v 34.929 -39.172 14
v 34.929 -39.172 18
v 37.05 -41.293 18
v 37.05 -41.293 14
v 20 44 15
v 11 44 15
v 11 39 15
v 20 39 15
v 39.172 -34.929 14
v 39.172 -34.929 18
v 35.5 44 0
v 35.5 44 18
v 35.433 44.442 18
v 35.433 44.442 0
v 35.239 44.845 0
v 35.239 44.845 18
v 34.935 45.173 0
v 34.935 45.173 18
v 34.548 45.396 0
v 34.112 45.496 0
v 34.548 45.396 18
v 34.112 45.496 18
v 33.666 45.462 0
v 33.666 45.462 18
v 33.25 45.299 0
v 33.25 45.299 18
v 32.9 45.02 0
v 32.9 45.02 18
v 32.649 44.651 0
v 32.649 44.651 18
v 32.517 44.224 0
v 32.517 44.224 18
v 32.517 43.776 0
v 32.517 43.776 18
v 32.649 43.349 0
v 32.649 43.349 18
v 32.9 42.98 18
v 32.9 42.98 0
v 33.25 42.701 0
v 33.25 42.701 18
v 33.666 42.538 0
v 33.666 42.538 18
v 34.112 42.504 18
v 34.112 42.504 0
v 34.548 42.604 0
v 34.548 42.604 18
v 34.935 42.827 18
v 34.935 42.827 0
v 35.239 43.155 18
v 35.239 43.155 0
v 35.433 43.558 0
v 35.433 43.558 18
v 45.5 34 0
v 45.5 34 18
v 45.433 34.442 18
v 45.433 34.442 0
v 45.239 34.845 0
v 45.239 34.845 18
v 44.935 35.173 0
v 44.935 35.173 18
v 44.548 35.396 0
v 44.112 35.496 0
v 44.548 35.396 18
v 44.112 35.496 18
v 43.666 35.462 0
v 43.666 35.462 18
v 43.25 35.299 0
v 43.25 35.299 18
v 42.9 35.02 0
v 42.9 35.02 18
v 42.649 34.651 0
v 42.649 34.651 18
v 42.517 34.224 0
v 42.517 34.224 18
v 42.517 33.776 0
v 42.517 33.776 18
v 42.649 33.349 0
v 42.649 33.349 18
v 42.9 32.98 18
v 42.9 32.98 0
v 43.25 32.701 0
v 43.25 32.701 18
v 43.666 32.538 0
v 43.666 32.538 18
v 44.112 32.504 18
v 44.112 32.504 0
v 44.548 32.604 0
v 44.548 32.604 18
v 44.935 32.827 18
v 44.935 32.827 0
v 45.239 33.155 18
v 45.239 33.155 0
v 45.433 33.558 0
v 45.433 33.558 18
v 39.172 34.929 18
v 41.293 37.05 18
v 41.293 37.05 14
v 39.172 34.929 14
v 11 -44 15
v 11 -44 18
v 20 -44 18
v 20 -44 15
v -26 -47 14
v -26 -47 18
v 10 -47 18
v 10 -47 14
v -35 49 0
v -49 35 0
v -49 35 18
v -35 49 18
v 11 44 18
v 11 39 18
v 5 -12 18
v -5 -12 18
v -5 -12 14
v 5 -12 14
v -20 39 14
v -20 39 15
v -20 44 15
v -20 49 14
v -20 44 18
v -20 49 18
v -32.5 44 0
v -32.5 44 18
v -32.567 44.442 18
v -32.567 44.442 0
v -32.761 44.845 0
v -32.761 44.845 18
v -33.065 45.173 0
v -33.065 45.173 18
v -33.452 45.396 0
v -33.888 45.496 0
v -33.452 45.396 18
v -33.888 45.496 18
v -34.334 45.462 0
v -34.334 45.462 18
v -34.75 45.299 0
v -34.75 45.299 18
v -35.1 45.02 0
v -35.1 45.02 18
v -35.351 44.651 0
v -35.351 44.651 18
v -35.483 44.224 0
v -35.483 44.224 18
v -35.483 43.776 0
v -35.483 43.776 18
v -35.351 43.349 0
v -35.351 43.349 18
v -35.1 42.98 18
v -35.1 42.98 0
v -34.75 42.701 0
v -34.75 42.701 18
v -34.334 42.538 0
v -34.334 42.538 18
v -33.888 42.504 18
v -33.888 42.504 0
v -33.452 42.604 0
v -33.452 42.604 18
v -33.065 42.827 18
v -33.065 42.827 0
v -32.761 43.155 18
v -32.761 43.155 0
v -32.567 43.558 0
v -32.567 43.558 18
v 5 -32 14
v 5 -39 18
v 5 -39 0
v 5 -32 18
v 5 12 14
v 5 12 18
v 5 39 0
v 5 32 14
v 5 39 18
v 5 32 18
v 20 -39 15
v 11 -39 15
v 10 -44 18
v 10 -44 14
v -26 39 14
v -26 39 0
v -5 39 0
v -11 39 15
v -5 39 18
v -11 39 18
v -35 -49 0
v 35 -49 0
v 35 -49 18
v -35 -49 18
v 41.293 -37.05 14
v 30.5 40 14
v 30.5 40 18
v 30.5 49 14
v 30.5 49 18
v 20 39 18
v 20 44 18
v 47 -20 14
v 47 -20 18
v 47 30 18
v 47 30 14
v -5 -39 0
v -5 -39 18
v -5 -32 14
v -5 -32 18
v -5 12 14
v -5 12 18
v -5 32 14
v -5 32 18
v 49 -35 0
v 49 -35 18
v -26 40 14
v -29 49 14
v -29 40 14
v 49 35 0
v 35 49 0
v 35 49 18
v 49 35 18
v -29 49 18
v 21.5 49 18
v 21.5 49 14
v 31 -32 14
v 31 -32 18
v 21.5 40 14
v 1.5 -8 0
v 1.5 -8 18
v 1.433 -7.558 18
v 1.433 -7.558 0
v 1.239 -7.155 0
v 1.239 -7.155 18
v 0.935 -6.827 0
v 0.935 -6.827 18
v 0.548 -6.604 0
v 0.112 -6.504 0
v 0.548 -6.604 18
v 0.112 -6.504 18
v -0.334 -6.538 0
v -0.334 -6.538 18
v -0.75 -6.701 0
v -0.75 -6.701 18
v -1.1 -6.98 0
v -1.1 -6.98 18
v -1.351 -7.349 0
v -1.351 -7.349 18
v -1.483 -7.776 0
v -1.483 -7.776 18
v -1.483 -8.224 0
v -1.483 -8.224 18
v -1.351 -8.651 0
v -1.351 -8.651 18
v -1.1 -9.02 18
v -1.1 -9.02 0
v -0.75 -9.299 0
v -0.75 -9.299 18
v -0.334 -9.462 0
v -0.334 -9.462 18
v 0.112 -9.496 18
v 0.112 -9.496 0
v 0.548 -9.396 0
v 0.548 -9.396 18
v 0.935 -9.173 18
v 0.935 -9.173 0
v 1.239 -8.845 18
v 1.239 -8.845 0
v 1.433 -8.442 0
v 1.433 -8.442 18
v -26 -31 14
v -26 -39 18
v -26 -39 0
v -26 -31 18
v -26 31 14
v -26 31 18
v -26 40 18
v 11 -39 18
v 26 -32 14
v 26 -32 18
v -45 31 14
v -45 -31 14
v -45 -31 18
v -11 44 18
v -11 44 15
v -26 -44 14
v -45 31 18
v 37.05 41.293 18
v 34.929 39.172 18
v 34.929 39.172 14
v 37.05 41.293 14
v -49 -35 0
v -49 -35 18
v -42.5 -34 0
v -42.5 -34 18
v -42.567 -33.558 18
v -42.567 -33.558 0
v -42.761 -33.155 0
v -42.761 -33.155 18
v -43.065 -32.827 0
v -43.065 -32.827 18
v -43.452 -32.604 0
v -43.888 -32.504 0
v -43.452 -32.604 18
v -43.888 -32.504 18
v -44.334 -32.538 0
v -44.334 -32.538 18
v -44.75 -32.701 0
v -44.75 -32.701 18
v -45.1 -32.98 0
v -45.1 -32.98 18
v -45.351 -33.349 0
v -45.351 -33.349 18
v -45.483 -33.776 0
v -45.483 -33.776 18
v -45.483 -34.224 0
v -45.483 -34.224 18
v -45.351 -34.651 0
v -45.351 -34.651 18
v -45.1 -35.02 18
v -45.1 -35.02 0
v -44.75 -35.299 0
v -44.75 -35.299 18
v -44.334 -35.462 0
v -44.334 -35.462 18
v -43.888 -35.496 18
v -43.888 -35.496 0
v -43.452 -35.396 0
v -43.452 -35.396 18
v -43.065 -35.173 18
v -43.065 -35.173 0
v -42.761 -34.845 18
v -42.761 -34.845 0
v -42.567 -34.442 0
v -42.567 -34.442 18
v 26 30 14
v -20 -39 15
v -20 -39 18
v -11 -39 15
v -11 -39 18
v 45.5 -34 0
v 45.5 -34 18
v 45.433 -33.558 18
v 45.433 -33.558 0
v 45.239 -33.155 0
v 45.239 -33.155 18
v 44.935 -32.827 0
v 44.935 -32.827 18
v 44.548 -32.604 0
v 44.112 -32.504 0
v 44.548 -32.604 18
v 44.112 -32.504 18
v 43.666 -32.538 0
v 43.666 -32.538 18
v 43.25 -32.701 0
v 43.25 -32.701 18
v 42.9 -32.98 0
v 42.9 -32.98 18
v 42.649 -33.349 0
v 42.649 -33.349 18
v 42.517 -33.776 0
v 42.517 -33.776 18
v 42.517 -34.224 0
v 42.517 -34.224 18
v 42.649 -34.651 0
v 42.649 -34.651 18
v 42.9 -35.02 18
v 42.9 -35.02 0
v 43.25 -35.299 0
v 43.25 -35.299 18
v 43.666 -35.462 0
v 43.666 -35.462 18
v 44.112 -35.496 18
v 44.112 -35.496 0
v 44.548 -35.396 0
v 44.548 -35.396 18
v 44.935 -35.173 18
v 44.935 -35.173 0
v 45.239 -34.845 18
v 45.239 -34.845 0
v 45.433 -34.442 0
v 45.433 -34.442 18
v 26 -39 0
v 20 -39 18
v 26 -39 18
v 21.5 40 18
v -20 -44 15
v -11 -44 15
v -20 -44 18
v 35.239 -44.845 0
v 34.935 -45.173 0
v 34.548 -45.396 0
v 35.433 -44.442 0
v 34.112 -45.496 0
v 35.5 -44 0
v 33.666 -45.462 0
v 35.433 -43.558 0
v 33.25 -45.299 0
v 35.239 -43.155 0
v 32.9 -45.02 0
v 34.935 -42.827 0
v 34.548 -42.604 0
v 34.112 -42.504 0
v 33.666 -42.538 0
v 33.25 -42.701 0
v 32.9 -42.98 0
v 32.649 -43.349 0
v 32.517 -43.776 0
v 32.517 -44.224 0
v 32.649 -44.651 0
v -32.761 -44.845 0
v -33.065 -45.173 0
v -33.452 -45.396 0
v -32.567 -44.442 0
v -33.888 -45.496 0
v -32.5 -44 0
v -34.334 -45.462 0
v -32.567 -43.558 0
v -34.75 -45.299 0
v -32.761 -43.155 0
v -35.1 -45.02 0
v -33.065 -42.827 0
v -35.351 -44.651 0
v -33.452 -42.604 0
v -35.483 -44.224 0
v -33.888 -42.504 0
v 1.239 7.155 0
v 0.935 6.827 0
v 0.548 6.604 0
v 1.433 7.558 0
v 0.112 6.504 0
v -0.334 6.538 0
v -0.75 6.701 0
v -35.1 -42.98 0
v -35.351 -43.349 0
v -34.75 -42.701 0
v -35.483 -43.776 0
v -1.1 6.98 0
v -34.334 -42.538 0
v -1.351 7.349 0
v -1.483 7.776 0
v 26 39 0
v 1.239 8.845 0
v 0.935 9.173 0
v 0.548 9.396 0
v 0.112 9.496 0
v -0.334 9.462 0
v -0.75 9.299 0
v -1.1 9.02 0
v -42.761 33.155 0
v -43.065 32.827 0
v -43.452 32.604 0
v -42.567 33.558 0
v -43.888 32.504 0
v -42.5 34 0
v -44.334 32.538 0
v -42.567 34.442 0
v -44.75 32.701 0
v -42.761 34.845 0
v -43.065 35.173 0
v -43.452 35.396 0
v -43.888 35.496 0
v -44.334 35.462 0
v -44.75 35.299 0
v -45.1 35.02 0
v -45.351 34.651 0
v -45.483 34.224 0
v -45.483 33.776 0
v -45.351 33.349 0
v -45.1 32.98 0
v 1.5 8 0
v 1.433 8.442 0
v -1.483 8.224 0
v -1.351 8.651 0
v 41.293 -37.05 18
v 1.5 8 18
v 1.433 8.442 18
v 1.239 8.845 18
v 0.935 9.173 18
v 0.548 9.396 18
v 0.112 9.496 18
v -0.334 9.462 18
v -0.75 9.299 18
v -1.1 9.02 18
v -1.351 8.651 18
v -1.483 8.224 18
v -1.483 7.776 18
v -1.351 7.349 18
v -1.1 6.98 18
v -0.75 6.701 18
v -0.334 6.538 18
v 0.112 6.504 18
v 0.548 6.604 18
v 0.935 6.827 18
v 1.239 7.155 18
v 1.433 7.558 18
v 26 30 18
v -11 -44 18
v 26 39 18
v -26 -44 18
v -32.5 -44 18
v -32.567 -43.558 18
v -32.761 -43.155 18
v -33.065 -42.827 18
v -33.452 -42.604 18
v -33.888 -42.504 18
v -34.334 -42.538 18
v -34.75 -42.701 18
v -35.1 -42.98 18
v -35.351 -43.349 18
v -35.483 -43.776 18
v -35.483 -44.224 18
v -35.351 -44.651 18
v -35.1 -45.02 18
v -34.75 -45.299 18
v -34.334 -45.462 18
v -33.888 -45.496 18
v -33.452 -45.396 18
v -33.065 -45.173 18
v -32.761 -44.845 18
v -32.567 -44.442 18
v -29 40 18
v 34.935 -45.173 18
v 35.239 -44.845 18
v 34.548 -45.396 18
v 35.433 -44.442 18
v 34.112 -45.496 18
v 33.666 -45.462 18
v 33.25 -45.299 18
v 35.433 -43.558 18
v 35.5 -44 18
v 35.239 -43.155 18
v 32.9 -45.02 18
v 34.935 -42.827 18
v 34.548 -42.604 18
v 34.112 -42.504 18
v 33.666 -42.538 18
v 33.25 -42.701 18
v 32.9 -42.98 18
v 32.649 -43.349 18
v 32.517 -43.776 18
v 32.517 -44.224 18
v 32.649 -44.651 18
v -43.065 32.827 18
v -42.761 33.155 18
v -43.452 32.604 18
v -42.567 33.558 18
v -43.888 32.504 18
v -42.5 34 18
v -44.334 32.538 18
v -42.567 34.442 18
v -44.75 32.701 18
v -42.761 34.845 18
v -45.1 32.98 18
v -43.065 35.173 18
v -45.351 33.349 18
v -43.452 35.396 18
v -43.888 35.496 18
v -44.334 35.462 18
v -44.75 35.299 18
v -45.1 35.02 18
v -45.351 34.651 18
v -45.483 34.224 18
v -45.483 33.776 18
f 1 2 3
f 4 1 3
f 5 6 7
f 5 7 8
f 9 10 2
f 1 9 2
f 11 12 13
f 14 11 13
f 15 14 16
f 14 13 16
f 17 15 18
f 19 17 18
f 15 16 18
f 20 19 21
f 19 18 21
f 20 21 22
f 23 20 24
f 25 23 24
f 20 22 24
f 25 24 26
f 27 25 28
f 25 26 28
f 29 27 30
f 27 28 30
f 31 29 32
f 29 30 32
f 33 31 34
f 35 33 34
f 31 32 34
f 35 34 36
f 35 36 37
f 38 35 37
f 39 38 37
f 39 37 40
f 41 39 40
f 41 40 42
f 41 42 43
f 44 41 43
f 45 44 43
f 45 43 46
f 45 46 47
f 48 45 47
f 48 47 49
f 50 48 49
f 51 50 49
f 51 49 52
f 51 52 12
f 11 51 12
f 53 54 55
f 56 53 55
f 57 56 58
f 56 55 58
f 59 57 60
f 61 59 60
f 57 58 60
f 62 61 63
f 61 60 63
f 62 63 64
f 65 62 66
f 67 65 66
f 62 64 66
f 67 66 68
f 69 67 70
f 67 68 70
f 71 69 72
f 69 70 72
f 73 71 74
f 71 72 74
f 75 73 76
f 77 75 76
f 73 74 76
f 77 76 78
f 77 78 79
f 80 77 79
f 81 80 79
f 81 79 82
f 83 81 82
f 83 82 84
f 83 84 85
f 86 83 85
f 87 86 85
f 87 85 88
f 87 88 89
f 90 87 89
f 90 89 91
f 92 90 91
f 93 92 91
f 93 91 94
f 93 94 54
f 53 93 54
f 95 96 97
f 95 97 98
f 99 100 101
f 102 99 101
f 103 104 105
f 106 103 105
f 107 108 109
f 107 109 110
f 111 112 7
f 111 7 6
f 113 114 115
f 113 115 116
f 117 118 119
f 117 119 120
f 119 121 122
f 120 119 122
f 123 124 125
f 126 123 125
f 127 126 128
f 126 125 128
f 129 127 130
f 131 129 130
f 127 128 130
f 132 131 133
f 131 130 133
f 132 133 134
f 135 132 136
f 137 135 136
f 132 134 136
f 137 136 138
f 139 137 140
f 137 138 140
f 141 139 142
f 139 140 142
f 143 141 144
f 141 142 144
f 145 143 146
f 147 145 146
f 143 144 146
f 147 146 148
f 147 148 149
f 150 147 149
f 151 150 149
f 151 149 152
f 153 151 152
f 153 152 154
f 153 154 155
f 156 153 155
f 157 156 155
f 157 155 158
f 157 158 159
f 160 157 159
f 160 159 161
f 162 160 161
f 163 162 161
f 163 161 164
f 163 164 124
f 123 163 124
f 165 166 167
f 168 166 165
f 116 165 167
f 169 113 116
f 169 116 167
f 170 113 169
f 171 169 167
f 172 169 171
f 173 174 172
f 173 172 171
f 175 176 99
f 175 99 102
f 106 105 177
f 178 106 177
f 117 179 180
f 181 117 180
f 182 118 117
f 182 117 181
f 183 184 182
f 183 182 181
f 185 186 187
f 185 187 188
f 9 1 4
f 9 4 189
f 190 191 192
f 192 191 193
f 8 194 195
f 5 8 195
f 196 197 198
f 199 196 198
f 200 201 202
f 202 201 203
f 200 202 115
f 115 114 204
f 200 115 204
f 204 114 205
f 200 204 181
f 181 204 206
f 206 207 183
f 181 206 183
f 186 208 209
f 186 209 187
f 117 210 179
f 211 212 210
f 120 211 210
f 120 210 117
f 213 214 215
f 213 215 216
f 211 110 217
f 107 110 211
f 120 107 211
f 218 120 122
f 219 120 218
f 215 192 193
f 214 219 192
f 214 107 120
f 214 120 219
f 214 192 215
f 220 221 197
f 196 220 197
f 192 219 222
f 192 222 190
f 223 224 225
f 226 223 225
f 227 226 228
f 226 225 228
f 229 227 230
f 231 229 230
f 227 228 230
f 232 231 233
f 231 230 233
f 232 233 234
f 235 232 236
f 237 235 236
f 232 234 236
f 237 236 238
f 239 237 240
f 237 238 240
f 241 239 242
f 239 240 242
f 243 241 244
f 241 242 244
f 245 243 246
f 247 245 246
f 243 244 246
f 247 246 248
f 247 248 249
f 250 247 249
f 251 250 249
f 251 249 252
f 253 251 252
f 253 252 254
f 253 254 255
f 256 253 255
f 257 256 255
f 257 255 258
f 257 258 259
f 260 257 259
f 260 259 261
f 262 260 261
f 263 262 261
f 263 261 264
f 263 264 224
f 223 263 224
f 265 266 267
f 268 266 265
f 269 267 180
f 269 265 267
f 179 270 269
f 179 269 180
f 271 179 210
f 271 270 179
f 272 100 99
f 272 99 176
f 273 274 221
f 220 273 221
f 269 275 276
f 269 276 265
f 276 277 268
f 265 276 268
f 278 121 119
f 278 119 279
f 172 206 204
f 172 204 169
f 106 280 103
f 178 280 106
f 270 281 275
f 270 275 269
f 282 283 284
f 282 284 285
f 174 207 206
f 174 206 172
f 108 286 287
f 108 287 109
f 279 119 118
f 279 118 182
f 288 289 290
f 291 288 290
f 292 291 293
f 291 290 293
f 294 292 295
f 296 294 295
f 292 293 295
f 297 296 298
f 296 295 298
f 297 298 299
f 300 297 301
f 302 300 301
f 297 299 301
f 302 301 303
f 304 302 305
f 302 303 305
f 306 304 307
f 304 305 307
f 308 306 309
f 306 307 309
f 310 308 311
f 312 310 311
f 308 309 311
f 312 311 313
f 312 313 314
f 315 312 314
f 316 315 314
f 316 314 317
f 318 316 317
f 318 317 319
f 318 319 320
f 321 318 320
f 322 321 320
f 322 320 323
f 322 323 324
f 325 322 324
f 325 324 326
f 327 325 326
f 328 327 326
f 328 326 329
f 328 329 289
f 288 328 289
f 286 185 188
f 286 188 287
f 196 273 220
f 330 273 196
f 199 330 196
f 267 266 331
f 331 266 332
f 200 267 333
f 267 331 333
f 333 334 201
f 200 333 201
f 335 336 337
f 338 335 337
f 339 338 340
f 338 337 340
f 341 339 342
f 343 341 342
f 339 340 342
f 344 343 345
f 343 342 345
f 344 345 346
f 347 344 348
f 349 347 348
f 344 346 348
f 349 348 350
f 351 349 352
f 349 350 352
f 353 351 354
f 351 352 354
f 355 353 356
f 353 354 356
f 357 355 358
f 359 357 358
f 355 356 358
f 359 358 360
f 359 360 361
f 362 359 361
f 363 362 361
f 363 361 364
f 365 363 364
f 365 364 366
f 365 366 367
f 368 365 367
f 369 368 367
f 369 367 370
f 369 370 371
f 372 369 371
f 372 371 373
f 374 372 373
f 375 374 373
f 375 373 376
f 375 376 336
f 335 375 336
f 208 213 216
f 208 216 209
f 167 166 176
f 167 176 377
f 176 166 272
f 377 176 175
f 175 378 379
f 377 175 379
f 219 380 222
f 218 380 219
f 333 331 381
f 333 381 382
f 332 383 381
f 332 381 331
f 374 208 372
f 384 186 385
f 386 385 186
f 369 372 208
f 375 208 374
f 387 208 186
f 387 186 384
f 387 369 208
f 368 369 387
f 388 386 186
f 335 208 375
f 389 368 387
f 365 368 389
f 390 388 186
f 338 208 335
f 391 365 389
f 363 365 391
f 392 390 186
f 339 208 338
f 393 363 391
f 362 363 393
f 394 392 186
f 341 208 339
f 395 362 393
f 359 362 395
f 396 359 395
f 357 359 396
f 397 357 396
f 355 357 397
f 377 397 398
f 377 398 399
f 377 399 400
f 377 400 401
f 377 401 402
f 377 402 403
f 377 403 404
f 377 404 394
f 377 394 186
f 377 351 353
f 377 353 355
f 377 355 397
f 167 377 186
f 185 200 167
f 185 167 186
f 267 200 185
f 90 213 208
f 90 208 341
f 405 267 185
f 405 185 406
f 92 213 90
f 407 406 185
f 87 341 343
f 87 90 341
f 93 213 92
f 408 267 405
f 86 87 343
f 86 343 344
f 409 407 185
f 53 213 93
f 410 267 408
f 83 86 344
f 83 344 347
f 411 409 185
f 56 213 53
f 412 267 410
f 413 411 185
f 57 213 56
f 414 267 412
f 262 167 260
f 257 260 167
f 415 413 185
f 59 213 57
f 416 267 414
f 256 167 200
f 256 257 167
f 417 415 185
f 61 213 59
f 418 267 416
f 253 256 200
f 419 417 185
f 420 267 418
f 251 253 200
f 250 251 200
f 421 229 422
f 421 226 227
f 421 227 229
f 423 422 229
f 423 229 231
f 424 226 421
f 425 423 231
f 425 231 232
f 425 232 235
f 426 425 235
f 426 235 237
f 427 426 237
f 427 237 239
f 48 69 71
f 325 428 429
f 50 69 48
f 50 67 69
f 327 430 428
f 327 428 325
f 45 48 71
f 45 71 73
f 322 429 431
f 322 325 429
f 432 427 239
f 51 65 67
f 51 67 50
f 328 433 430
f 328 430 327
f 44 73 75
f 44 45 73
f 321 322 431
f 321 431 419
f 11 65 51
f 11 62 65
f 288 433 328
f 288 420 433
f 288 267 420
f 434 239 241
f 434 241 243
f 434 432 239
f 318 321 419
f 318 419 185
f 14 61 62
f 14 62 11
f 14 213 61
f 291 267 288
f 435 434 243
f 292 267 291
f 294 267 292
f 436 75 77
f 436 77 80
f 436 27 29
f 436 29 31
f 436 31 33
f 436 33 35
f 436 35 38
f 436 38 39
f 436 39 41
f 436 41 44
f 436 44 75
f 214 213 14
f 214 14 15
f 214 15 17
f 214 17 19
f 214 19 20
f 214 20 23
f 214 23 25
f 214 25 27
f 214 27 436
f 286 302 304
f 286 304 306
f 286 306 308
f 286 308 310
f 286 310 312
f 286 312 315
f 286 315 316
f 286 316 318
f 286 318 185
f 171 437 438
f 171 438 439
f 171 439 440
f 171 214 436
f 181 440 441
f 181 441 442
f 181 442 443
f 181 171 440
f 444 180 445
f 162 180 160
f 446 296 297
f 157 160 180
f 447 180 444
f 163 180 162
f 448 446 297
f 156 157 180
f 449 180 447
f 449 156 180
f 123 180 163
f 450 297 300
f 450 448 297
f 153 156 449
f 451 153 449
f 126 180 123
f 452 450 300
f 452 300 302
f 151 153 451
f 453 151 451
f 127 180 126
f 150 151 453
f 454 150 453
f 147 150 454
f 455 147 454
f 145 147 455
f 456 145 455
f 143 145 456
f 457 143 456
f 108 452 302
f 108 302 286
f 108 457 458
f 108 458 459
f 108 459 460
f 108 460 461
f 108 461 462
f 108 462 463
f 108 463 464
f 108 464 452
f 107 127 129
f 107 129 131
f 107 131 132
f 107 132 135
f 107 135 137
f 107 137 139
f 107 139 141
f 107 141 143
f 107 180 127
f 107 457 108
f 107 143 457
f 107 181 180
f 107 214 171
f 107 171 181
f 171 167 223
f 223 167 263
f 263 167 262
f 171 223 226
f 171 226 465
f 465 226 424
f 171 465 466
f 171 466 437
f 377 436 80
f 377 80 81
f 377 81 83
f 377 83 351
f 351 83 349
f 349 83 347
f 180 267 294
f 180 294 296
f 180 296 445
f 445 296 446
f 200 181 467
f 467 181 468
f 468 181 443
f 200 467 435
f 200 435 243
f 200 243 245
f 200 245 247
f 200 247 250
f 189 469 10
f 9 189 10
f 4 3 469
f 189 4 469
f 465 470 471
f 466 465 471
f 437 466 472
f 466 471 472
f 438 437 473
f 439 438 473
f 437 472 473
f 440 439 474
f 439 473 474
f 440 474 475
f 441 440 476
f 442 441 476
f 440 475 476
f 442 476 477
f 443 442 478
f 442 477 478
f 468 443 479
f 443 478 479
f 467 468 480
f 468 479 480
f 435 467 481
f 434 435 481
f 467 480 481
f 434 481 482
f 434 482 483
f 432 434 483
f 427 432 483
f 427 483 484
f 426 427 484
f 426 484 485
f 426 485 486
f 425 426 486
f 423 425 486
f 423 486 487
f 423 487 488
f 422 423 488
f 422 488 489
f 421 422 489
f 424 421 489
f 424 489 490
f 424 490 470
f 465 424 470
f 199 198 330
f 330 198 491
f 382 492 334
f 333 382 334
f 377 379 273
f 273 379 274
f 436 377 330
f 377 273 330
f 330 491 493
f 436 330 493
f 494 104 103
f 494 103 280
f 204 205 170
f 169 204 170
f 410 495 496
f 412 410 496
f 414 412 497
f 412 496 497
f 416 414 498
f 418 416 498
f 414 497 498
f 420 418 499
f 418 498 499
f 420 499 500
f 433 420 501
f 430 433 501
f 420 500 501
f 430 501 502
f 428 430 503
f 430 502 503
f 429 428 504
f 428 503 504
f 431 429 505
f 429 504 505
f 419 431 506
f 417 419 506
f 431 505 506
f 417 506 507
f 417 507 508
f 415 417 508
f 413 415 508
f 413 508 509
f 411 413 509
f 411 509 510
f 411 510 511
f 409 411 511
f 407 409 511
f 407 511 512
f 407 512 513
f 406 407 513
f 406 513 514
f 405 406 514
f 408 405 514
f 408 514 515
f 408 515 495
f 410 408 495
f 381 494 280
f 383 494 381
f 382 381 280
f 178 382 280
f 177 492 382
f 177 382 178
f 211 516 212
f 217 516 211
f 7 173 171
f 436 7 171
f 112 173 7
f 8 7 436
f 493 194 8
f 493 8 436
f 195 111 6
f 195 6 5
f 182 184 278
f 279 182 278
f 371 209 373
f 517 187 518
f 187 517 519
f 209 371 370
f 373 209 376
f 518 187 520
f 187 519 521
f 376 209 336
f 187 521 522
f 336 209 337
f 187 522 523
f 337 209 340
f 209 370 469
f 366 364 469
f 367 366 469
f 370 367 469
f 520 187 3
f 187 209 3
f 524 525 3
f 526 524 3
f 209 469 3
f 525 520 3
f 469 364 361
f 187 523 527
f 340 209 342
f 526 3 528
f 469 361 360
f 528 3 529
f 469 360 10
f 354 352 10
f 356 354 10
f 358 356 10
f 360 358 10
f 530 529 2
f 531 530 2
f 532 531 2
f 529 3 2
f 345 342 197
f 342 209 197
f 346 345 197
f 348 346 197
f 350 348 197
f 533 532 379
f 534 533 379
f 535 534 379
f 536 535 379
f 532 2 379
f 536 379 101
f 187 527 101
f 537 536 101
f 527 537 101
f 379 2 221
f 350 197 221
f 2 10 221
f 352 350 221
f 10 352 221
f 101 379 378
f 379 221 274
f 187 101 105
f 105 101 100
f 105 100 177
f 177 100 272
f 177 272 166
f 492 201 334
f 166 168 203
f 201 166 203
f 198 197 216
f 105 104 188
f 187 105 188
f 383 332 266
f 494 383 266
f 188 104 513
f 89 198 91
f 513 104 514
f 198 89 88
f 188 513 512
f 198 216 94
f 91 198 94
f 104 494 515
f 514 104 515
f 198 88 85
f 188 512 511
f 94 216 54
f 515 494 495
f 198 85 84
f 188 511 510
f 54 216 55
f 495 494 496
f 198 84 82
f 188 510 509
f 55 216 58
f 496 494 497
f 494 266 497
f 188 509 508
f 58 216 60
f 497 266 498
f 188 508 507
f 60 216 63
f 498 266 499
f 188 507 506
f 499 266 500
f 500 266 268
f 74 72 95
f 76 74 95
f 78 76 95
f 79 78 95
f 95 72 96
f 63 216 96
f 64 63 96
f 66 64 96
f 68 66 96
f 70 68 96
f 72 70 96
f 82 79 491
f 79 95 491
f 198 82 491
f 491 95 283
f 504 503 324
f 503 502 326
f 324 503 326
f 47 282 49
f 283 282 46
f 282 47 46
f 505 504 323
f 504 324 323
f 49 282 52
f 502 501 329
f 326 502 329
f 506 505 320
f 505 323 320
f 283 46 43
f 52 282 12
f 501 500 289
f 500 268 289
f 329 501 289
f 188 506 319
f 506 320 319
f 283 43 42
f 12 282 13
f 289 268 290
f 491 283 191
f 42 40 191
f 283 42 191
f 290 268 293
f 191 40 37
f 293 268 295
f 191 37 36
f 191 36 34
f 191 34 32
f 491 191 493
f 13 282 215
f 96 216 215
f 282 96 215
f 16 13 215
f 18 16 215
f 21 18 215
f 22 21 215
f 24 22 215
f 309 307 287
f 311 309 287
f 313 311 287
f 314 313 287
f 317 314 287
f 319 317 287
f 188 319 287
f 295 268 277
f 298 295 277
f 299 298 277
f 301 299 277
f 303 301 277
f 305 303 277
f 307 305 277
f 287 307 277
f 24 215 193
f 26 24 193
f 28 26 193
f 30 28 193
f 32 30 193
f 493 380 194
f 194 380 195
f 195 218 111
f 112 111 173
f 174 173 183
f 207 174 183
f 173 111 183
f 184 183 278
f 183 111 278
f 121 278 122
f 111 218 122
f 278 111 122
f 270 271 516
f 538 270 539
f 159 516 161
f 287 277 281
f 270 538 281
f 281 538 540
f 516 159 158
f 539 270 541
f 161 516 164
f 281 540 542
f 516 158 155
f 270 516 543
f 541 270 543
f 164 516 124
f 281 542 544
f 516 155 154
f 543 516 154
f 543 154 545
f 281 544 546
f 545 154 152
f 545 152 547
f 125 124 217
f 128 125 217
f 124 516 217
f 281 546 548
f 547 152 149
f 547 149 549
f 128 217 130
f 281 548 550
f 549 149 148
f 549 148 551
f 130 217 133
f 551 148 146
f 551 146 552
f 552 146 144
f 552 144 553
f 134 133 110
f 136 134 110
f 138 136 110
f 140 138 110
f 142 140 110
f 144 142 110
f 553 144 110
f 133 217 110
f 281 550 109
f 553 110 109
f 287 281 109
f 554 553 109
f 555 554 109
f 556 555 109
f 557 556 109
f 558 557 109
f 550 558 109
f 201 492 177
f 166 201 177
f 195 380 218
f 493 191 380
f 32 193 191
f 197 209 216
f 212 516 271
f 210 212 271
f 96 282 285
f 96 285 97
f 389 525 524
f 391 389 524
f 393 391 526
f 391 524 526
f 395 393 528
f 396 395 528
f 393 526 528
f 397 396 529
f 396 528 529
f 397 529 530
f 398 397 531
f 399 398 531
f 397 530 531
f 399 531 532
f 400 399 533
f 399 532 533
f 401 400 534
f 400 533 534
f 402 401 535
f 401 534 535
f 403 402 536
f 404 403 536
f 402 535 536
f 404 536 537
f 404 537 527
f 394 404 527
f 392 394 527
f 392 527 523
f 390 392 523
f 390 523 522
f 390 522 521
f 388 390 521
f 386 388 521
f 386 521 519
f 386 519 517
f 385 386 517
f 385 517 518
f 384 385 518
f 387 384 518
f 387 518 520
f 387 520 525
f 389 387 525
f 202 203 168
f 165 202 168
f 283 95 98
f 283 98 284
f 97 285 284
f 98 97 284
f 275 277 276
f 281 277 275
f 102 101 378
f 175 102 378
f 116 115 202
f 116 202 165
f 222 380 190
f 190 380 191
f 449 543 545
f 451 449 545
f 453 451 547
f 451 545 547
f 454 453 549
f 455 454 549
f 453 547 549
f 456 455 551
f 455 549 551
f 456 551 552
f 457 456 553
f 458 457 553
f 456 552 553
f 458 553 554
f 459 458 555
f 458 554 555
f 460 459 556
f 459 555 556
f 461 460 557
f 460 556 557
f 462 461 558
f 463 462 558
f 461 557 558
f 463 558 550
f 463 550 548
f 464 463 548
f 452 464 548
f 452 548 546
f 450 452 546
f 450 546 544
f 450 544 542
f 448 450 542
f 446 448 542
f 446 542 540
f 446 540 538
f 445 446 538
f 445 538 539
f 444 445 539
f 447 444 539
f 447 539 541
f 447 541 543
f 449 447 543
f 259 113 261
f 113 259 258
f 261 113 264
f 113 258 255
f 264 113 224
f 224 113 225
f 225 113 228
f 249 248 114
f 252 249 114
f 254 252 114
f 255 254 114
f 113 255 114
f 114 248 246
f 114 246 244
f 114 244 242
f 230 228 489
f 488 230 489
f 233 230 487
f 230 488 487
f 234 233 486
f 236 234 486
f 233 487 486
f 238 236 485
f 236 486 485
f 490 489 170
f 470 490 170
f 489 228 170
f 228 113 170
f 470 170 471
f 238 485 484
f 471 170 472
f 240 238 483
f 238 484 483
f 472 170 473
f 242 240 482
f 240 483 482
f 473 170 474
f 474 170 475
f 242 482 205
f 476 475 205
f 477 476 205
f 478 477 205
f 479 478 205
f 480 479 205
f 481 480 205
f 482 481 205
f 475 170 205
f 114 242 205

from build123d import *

# Parameters (mm, degrees)
PAD_DEPTH       = 18
SKETCH001_R     = 1.5
POCKET_DEPTH    = 18.001
SKETCH002_W     = 21
SKETCH002_H     = 78
POCKET001_DEPTH = 18.001
SKETCH003_W     = 9
SKETCH003_H     = 88
POCKET002_DEPTH = 3
SKETCH004_W     = 12
SKETCH004_H     = 20
SKETCH004_W_2   = 19
SKETCH004_H_2   = 62
SKETCH004_W_3   = 9
SKETCH004_H_3   = 9
SKETCH004_W_4   = 36
SKETCH004_H_4   = 3
POCKET003_DEPTH = 4
SKETCH005_W     = 6
SKETCH005_H     = 1
POCKET004_DEPTH = 4


with BuildPart() as part:
    # Sketch → Pad (new body)
    with BuildSketch(Plane.XY):
        Polygon((-49, 35), (-35, 49), (35, 49), (49, 35), (49, -35), (35, -49), (-35, -49), (-49, -35), align=None)
    extrude(amount=PAD_DEPTH)

    # Sketch001 (on DatumPlane) → Pocket (cut, through all)
    with BuildSketch(Plane.XY.offset(18)):
        with Locations((-34, 44)):
            Circle(SKETCH001_R)
        with Locations((34, 44)):
            Circle(SKETCH001_R)
        with Locations((44, 34)):
            Circle(SKETCH001_R)
        with Locations((-44, 34)):
            Circle(SKETCH001_R)
        with Locations((-44, -34)):
            Circle(SKETCH001_R)
        with Locations((-34, -44)):
            Circle(SKETCH001_R)
        with Locations((34, -44)):
            Circle(SKETCH001_R)
        with Locations((44, -34)):
            Circle(SKETCH001_R)
        with Locations((0, 8)):
            Circle(SKETCH001_R)
        with Locations((0, -8)):
            Circle(SKETCH001_R)
    extrude(amount=-POCKET_DEPTH, mode=Mode.SUBTRACT)

    # Sketch002 (on DatumPlane) → Pocket001 (cut, through all)
    with BuildSketch(Plane.XY.offset(18)):
        with Locations((-15.5, 0)):
            Rectangle(SKETCH002_W, SKETCH002_H)
        with Locations((15.5, 0)):
            Rectangle(SKETCH002_W, SKETCH002_H)
    extrude(amount=-POCKET001_DEPTH, mode=Mode.SUBTRACT)

    # Sketch003 (on DatumPlane) → Pocket002 (cut)
    with BuildSketch(Plane.XY.offset(18)):
        with Locations((-15.5, 0)):
            Rectangle(SKETCH003_W, SKETCH003_H)
        with Locations((15.5, 0)):
            Rectangle(SKETCH003_W, SKETCH003_H)
    extrude(amount=-POCKET002_DEPTH, mode=Mode.SUBTRACT)

    # Sketch004 (on DatumPlane) → Pocket003 (cut)
    with BuildSketch(Plane.XY.offset(18)):
        with Locations((0, 22)):
            Rectangle(SKETCH004_W, SKETCH004_H)
        with Locations((0, -22)):
            Rectangle(SKETCH004_W, SKETCH004_H)
        with Locations((-35.5, 0)):
            Rectangle(SKETCH004_W_2, SKETCH004_H_2)
        with Locations((-24.5, 44.5)):
            Rectangle(SKETCH004_W_3, SKETCH004_H_3)
        with Locations((26, 44.5)):
            Rectangle(SKETCH004_W_3, SKETCH004_H_3)
        Polygon((37.050253, 41.292893), (41.292893, 37.050253), (39.171573, 34.928932), (34.928932, 39.171573), align=None)
        Polygon((34.928932, -39.171573), (37.050253, -41.292893), (41.292893, -37.050253), (39.171573, -34.928932), align=None)
        with Locations((-8, -45.5)):
            Rectangle(SKETCH004_W_4, SKETCH004_H_4)
        Polygon((47, 30), (26, 30), (26, -32), (31, -32), (47, -20), align=None)
    extrude(amount=-POCKET003_DEPTH, mode=Mode.SUBTRACT)

    # Sketch005 (on DatumPlane) → Pocket004 (cut)
    with BuildSketch(Plane.XY.offset(18)):
        with Locations((-23, 39.5)):
            Rectangle(SKETCH005_W, SKETCH005_H)
    extrude(amount=-POCKET004_DEPTH, mode=Mode.SUBTRACT)


solid = part.part
